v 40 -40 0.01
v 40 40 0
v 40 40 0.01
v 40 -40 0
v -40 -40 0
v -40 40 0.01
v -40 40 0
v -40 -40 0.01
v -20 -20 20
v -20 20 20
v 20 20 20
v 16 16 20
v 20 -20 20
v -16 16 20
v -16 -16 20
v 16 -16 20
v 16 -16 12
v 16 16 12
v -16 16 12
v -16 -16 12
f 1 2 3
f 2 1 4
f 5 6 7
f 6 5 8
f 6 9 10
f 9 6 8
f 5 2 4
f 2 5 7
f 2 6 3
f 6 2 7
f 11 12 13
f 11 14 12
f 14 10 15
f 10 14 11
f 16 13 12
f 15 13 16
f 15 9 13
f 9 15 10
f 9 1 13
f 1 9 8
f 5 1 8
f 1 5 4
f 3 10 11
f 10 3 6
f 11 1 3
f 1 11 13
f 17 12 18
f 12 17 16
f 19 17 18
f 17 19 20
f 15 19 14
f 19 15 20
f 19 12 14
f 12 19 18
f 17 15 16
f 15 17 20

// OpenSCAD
// Tapered riser block for raising a beaker
// Solid square frustum with a square pocket in the top face

// ---- Dimensions (mm) ----
base_size    = 80;   // bottom square side length (at z = 0)
top_size     = 40;   // top square side length (at z = height)
height       = 20;   // overall height of the frustum
pocket_size  = 32;   // square pocket side length
pocket_depth = 8;    // pocket depth from top face
eps          = 0.5;  // overshoot for clean boolean cuts

$fn = 64;

// ---- Frustum via polyhedron-free hull of thin slabs ----
module frustum() {
    hull() {
        // bottom square
        translate([-base_size/2, -base_size/2, 0])
            cube([base_size, base_size, 0.01]);
        // top square
        translate([-top_size/2, -top_size/2, height - 0.01])
            cube([top_size, top_size, 0.01]);
    }
}

difference() {
    frustum();
    // centred square pocket cut into the top face
    translate([-pocket_size/2, -pocket_size/2, height - pocket_depth])
        cube([pocket_size, pocket_size, pocket_depth + eps]);
}
